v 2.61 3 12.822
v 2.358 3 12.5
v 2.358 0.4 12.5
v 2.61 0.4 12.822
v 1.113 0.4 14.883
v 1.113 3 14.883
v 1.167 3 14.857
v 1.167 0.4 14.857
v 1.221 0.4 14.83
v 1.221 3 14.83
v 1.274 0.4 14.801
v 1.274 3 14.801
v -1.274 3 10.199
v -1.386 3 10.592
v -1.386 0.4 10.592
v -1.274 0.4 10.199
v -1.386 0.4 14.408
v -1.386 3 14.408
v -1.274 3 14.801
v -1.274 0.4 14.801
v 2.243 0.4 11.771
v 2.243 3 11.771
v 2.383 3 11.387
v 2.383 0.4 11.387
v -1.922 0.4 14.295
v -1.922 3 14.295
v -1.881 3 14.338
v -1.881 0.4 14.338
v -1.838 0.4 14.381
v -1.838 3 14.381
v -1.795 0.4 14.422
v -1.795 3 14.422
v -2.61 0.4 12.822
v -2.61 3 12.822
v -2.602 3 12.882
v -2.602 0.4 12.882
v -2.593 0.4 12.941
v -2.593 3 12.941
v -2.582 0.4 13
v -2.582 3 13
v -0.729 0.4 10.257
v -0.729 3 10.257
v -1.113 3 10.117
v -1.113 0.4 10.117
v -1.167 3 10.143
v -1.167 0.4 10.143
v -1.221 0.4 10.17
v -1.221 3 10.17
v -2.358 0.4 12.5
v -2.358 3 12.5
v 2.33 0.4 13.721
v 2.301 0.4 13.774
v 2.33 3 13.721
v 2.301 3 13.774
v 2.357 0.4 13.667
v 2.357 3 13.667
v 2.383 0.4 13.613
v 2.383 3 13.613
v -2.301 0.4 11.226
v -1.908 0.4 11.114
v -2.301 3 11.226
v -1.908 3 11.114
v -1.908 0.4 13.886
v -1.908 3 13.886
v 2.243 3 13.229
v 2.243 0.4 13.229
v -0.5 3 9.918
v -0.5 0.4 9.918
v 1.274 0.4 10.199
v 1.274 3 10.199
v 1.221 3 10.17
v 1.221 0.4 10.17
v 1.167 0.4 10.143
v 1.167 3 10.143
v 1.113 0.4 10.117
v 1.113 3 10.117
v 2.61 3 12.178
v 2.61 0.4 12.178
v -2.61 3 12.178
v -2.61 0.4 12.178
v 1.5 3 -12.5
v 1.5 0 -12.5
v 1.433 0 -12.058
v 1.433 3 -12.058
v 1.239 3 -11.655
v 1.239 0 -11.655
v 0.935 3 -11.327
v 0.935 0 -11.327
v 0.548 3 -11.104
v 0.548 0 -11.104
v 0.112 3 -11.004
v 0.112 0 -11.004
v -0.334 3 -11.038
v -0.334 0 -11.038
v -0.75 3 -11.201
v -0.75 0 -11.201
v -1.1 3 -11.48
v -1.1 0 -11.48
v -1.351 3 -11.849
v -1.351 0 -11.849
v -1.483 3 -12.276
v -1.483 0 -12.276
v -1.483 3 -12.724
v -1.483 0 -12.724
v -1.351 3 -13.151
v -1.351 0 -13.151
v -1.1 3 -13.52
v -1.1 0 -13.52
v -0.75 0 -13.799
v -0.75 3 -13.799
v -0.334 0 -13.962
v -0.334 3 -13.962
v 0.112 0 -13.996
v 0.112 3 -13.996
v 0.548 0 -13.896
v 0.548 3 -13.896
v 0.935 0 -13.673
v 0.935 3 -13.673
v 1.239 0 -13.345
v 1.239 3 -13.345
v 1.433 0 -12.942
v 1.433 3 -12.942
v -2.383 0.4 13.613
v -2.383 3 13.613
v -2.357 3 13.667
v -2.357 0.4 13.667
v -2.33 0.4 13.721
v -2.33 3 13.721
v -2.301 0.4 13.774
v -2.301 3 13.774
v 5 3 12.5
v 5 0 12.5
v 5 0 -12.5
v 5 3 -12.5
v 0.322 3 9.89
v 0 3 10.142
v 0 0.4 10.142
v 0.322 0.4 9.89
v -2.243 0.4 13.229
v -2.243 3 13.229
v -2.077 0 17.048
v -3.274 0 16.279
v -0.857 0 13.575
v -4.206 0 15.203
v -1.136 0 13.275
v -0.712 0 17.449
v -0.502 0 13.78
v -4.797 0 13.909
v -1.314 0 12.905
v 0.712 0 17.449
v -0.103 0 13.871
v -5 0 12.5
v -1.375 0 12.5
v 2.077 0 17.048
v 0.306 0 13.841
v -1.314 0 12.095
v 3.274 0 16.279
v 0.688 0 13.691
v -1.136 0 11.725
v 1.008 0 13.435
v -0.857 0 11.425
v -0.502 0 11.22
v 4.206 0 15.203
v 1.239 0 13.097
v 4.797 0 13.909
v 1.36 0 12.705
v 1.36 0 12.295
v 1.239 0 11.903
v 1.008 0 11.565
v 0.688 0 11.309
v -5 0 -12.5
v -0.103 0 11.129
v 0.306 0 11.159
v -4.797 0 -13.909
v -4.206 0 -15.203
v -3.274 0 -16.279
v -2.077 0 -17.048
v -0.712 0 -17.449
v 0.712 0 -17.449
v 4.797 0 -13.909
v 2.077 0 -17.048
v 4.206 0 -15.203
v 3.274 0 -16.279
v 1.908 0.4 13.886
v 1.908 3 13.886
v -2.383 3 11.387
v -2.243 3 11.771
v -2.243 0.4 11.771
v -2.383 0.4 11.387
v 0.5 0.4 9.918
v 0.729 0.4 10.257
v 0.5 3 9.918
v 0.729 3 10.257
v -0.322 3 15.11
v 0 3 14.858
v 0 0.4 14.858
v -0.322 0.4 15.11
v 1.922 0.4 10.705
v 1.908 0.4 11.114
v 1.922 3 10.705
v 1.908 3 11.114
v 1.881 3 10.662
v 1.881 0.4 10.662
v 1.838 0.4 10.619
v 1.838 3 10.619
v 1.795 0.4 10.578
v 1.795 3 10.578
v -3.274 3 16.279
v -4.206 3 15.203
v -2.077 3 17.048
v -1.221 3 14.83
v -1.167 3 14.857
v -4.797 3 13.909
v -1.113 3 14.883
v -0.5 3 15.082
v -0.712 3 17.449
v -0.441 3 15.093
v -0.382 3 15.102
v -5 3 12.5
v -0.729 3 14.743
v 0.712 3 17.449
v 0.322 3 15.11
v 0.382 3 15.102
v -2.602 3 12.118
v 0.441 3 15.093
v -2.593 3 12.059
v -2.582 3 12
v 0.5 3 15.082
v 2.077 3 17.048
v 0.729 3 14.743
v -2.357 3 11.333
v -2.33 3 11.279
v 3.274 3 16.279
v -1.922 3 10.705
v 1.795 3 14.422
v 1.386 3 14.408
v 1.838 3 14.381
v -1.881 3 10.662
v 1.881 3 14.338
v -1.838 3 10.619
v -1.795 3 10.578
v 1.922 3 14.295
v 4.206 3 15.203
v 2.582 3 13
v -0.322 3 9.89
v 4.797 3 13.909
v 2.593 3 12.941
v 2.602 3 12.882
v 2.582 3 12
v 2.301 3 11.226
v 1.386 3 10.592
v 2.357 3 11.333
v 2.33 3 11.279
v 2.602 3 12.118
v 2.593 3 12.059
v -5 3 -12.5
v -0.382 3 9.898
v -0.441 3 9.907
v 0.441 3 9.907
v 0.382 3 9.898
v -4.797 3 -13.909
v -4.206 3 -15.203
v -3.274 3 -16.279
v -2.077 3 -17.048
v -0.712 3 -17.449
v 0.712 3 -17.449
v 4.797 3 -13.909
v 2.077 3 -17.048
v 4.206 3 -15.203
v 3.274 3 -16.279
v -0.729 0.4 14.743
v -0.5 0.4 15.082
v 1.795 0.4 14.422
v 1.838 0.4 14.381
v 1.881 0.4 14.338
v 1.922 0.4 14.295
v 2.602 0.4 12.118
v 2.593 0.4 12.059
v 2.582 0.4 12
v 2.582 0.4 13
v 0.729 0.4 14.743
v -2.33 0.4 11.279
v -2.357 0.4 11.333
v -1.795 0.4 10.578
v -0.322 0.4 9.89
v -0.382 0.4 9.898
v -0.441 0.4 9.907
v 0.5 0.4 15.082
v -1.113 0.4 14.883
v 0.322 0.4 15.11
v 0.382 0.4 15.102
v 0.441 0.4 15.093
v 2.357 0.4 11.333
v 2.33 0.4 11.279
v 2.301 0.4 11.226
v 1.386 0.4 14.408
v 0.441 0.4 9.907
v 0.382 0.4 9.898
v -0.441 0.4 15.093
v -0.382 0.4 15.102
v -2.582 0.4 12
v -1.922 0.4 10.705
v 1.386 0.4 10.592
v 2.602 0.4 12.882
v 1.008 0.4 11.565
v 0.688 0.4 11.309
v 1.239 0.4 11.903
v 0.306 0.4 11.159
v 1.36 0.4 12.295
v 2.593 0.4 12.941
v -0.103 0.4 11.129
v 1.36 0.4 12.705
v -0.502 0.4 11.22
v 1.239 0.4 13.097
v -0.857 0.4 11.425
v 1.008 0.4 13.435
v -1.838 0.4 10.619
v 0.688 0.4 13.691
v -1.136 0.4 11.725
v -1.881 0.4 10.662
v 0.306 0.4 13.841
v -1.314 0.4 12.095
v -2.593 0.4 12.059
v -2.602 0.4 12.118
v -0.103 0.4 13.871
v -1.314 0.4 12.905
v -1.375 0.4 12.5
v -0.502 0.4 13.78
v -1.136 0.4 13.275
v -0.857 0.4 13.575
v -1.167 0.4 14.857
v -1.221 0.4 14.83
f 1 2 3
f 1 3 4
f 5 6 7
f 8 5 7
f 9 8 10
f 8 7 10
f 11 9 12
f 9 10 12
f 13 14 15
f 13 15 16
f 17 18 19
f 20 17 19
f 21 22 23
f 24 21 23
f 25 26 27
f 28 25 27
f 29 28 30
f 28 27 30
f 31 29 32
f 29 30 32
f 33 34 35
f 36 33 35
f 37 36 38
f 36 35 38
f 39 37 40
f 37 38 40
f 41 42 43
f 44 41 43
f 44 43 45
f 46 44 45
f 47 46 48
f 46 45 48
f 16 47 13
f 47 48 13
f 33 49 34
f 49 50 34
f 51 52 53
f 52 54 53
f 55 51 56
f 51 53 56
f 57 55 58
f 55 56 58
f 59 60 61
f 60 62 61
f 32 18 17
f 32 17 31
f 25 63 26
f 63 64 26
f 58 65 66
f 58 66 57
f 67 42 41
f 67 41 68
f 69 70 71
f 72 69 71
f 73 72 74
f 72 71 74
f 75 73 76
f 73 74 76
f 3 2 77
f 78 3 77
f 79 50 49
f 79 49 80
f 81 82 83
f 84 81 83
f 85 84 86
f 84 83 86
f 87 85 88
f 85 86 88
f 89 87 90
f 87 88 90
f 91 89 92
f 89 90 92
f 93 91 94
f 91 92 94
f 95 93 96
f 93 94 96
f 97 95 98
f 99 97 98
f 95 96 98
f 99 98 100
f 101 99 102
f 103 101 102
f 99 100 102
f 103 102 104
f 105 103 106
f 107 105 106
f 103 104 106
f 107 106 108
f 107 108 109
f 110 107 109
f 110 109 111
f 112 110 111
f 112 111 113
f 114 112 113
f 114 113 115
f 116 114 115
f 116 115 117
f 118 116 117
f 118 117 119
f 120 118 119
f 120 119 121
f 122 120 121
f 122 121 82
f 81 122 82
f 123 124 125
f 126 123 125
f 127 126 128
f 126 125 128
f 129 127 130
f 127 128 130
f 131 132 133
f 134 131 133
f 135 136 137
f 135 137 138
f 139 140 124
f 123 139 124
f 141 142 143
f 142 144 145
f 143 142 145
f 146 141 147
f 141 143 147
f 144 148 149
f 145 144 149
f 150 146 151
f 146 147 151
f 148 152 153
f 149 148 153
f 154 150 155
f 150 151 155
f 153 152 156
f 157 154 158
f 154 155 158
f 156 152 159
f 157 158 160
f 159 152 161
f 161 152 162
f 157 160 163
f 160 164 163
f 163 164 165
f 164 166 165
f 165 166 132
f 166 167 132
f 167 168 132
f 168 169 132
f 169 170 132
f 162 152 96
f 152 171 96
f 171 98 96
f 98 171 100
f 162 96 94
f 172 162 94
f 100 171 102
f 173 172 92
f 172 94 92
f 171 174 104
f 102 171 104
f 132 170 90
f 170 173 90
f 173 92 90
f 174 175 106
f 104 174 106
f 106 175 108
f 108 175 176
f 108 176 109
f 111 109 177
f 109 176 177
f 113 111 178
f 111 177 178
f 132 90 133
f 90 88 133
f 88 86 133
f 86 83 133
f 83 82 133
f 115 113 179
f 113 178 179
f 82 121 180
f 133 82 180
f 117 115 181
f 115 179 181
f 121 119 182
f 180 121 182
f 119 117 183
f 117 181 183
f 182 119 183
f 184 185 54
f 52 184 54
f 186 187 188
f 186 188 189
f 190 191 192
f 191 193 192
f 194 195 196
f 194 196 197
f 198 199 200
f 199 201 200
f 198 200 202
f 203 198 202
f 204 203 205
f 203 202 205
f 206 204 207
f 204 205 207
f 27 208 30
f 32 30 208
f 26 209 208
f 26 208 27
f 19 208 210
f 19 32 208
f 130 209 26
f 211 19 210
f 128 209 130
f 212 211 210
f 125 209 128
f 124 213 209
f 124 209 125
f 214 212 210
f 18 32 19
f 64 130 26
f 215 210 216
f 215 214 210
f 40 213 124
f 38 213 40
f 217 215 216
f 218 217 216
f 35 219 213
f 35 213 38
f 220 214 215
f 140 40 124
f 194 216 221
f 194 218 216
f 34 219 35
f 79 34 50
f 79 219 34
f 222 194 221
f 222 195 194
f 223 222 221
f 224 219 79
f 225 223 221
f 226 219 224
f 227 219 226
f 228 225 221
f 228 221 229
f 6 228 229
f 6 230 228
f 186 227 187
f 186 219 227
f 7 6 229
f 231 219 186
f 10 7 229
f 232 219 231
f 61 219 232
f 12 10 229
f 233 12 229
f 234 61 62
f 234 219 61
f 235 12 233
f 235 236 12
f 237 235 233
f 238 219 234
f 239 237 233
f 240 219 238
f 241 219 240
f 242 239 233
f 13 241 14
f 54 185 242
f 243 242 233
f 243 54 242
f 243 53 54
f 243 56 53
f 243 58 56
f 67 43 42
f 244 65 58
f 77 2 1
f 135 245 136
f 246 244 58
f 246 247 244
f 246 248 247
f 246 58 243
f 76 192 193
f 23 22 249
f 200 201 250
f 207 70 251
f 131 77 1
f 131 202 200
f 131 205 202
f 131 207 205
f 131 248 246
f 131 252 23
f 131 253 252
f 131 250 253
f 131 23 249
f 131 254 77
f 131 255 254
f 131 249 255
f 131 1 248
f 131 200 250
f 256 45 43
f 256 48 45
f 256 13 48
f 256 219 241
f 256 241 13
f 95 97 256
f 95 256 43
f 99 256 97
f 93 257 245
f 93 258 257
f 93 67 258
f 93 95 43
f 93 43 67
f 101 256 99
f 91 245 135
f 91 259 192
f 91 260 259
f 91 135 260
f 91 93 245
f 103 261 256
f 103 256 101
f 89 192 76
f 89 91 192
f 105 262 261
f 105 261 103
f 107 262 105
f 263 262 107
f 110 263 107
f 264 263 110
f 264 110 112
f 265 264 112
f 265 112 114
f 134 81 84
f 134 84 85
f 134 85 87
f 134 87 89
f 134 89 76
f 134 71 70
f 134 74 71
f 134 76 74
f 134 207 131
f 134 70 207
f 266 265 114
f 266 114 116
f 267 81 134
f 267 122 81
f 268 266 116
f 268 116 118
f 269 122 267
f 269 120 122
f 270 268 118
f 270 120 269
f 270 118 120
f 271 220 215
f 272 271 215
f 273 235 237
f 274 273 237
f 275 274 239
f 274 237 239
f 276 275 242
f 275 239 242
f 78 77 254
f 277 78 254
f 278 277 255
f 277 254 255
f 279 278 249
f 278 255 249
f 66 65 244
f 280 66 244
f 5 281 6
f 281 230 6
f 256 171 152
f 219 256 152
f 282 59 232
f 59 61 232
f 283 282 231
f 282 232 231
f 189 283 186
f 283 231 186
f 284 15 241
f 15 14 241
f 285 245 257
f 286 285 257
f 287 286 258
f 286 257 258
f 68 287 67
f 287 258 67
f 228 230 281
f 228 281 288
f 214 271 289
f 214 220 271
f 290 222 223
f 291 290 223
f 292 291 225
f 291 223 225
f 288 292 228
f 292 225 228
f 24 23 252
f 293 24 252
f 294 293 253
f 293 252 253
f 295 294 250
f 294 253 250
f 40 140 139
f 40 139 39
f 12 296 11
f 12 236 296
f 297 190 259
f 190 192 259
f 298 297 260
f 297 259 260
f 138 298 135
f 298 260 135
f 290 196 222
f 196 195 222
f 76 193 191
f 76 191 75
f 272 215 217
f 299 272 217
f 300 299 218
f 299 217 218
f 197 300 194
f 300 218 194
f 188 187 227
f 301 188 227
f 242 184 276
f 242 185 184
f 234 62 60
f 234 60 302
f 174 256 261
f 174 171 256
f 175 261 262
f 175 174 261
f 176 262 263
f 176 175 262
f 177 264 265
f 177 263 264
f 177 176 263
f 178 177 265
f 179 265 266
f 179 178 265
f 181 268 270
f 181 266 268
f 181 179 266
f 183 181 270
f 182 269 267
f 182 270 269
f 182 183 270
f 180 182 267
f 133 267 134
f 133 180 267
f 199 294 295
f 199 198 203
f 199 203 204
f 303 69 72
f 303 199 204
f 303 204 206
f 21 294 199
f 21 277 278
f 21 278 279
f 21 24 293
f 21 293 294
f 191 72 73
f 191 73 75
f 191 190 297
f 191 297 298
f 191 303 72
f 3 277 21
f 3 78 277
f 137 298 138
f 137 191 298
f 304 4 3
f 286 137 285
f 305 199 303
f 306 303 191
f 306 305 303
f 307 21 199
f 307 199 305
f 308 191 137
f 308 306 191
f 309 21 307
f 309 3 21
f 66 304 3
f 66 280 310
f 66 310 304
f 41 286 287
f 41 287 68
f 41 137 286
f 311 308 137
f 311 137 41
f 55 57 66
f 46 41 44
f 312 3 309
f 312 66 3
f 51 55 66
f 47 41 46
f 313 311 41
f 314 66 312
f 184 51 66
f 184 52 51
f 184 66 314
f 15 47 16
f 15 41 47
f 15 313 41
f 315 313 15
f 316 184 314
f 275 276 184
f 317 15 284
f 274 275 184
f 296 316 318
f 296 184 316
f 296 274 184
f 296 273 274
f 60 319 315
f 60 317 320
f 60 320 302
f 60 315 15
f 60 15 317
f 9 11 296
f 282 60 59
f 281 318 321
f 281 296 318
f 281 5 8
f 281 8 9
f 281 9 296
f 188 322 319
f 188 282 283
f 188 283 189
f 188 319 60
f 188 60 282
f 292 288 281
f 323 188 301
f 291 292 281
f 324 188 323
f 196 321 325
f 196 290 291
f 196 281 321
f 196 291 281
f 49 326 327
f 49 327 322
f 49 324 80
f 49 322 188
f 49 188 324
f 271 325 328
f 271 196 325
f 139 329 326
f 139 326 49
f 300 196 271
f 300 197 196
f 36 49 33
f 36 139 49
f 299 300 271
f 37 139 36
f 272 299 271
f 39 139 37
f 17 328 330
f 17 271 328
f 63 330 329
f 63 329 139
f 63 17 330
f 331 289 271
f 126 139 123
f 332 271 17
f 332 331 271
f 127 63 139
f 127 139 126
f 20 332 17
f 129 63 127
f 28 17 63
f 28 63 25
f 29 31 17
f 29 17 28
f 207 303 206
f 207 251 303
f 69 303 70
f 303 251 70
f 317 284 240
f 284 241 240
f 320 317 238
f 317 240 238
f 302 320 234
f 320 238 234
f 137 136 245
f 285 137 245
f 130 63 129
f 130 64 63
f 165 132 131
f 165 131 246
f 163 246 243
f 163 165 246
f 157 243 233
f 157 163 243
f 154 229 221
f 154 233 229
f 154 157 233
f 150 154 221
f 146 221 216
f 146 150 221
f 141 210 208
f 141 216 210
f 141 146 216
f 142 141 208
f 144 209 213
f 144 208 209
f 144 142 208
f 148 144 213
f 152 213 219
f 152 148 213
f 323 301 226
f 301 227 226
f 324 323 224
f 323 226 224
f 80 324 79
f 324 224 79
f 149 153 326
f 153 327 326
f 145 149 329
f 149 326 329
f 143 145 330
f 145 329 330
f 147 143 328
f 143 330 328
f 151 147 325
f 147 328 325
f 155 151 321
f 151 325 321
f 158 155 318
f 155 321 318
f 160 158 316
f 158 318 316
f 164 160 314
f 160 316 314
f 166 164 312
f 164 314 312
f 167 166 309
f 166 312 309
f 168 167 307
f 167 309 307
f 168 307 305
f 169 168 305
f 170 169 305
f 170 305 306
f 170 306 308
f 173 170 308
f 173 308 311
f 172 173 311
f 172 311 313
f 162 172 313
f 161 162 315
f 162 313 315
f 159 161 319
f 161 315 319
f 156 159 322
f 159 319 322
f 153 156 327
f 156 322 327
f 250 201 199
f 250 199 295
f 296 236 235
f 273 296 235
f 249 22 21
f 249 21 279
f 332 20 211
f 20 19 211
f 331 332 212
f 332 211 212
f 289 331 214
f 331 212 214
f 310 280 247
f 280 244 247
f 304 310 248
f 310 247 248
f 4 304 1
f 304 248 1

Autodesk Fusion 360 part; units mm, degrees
sketch "Sketch1" plane through (0, 0, 0) normal (0, 1, 0) x (1, 0, 0)
  line L0 (5, 12.5) -> (-5, 12.5)
  line L1 (-5, 12.5) -> (-5, -12.5)
  line L2 (-5, -12.5) -> (5, -12.5)
  line L3 (5, -12.5) -> (5, 12.5)
  line L4 (5, 12.5) -> (-5, -12.5) construction
  line L5 (-5, 12.5) -> (5, -12.5) construction
  arc A0 (5, 12.5) -> (-5, 12.5) centre (0, 12.5) ccw
  line L6 (-5, 0) -> (5, 0) construction
  circle A1 centre (0, 12.5) radius 1.5
  arc A2 (-5, -12.5) -> (5, -12.5) centre (0, -12.5) ccw
  circle A3 centre (0, -12.5) radius 1.5
  dimension "d1" = 10
  dimension "d2" = 25
  dimension "d3" = 3
extrude "Extrude1" add sketch "Sketch1" along normal blind 3 contours L0 L1 L2 L3 A1 A3 | L0 A0 A1 | L2 A2 A3 | L2 A3 | L2 A3
sketch "Boceto2" plane through (0, 3, 0) normal (0, 1, 0) x (-1, 0, 0)
  circle A0 centre (0, -12.5) radius 1.5
  arc A1 (5, 12.5) -> (-5, 12.5) centre (0, 12.5) ccw
  line L0 (-5, 12.5) -> (-5, -12.5)
  arc A2 (-5, -12.5) -> (5, -12.5) centre (0, -12.5) ccw
  line L1 (5, -12.5) -> (5, 12.5)
  circle A3 centre (0, 12.5) radius 2.63
  line L2 (0, 9.87) -> (0, 15.13) construction
  line L3 (0, 10.1418) -> (0.322, 9.8898)
  line L4 (0, 10.1418) -> (-0.322, 9.8898)
  line L5 (0.7287, 10.2572) -> (1.1128, 10.117)
  line L6 (0.7287, 10.2572) -> (0.5004, 9.918)
  line L7 (1.3861, 10.5922) -> (1.7947, 10.5776)
  line L8 (1.3861, 10.5922) -> (1.2737, 10.199)
  line L9 (1.9078, 11.1139) -> (2.301, 11.2263)
  line L10 (1.9078, 11.1139) -> (1.9224, 10.7053)
  line L11 (2.2428, 11.7713) -> (2.582, 11.9996)
  line L12 (2.2428, 11.7713) -> (2.383, 11.3872)
  line L13 (2.3582, 12.5) -> (2.6102, 12.822)
  line L14 (2.3582, 12.5) -> (2.6102, 12.178)
  line L15 (2.2428, 13.2287) -> (2.383, 13.6128)
  line L16 (2.2428, 13.2287) -> (2.582, 13.0004)
  line L17 (1.9078, 13.8861) -> (1.9224, 14.2947)
  line L18 (1.9078, 13.8861) -> (2.301, 13.7737)
  line L19 (1.3861, 14.4078) -> (1.2737, 14.801)
  line L20 (1.3861, 14.4078) -> (1.7947, 14.4224)
  line L21 (0.7287, 14.7428) -> (0.5004, 15.082)
  line L22 (0.7287, 14.7428) -> (1.1128, 14.883)
  line L23 (0, 14.8582) -> (-0.322, 15.1102)
  line L24 (0, 14.8582) -> (0.322, 15.1102)
  line L25 (-0.7287, 14.7428) -> (-1.1128, 14.883)
  line L26 (-0.7287, 14.7428) -> (-0.5004, 15.082)
  line L27 (-1.3861, 14.4078) -> (-1.7947, 14.4224)
  line L28 (-1.3861, 14.4078) -> (-1.2737, 14.801)
  line L29 (-1.9078, 13.8861) -> (-2.301, 13.7737)
  line L30 (-1.9078, 13.8861) -> (-1.9224, 14.2947)
  line L31 (-2.2428, 13.2287) -> (-2.582, 13.0004)
  line L32 (-2.2428, 13.2287) -> (-2.383, 13.6128)
  line L33 (-2.3582, 12.5) -> (-2.6102, 12.178)
  line L34 (-2.3582, 12.5) -> (-2.6102, 12.822)
  line L35 (-2.2428, 11.7713) -> (-2.383, 11.3872)
  line L36 (-2.2428, 11.7713) -> (-2.582, 11.9996)
  line L37 (-1.9078, 11.1139) -> (-1.9224, 10.7053)
  line L38 (-1.9078, 11.1139) -> (-2.301, 11.2263)
  line L39 (-1.3861, 10.5922) -> (-1.2737, 10.199)
  line L40 (-1.3861, 10.5922) -> (-1.7947, 10.5776)
  line L41 (-0.7287, 10.2572) -> (-0.5004, 9.918)
  line L42 (-0.7287, 10.2572) -> (-1.1128, 10.117)
  dimension "d6" = 5.26
  dimension "d7" = 0.252
  dimension "d8" = 0.322
  dimension "d10" = 360
extrude "Extruir2" cut sketch "Boceto2" against normal blind 2.6 contours A3 L3 L4 L5 L6 L7 L8 L9 L10 L11 L12 L13 L14 L15 L16 L17 L18 L19 L20 L21 L22 L23 L24 L25 L26 L27 L28 L29 L30 L31 L32 L33 L34 L35 L36 L37 L38 L39 L40 L41 L42
sketch "Boceto3" plane through (0, 0.4, 0) normal (0, 1, 0) x (-1, 0, 0)
  arc A0 (-0.5004, 9.918) -> (-0.322, 9.8898) centre (0, 12.5) ccw
  line L0 (-0.322, 9.8898) -> (0, 10.1418)
  line L1 (0, 10.1418) -> (0.322, 9.8898)
  arc A1 (0.322, 9.8898) -> (0.5004, 9.918) centre (0, 12.5) ccw
  line L2 (0.5004, 9.918) -> (0.7287, 10.2572)
  line L3 (0.7287, 10.2572) -> (1.1128, 10.117)
  arc A2 (1.1128, 10.117) -> (1.2737, 10.199) centre (0, 12.5) ccw
  line L4 (1.2737, 10.199) -> (1.3861, 10.5922)
  line L5 (1.3861, 10.5922) -> (1.7947, 10.5776)
  arc A3 (1.7947, 10.5776) -> (1.9224, 10.7053) centre (0, 12.5) ccw
  line L6 (1.9224, 10.7053) -> (1.9078, 11.1139)
  line L7 (1.9078, 11.1139) -> (2.301, 11.2263)
  arc A4 (2.301, 11.2263) -> (2.383, 11.3872) centre (0, 12.5) ccw
  line L8 (2.383, 11.3872) -> (2.2428, 11.7713)
  line L9 (2.2428, 11.7713) -> (2.582, 11.9996)
  arc A5 (2.582, 11.9996) -> (2.6102, 12.178) centre (0, 12.5) ccw
  line L10 (2.6102, 12.178) -> (2.3582, 12.5)
  line L11 (2.3582, 12.5) -> (2.6102, 12.822)
  arc A6 (2.6102, 12.822) -> (2.582, 13.0004) centre (0, 12.5) ccw
  line L12 (2.582, 13.0004) -> (2.2428, 13.2287)
  line L13 (2.2428, 13.2287) -> (2.383, 13.6128)
  arc A7 (2.383, 13.6128) -> (2.301, 13.7737) centre (0, 12.5) ccw
  line L14 (2.301, 13.7737) -> (1.9078, 13.8861)
  line L15 (1.9078, 13.8861) -> (1.9224, 14.2947)
  arc A8 (1.9224, 14.2947) -> (1.7947, 14.4224) centre (0, 12.5) ccw
  line L16 (1.7947, 14.4224) -> (1.3861, 14.4078)
  line L17 (1.3861, 14.4078) -> (1.2737, 14.801)
  arc A9 (1.2737, 14.801) -> (1.1128, 14.883) centre (0, 12.5) ccw
  line L18 (1.1128, 14.883) -> (0.7287, 14.7428)
  line L19 (0.7287, 14.7428) -> (0.5004, 15.082)
  arc A10 (0.5004, 15.082) -> (0.322, 15.1102) centre (0, 12.5) ccw
  line L20 (0.322, 15.1102) -> (0, 14.8582)
  line L21 (0, 14.8582) -> (-0.322, 15.1102)
  arc A11 (-0.322, 15.1102) -> (-0.5004, 15.082) centre (0, 12.5) ccw
  line L22 (-0.5004, 15.082) -> (-0.7287, 14.7428)
  line L23 (-0.7287, 14.7428) -> (-1.1128, 14.883)
  arc A12 (-1.1128, 14.883) -> (-1.2737, 14.801) centre (0, 12.5) ccw
  line L24 (-1.2737, 14.801) -> (-1.3861, 14.4078)
  line L25 (-1.3861, 14.4078) -> (-1.7947, 14.4224)
  arc A13 (-1.7947, 14.4224) -> (-1.9224, 14.2947) centre (0, 12.5) ccw
  line L26 (-1.9224, 14.2947) -> (-1.9078, 13.8861)
  line L27 (-1.9078, 13.8861) -> (-2.301, 13.7737)
  arc A14 (-2.301, 13.7737) -> (-2.383, 13.6128) centre (0, 12.5) ccw
  line L28 (-2.383, 13.6128) -> (-2.2428, 13.2287)
  line L29 (-2.2428, 13.2287) -> (-2.582, 13.0004)
  arc A15 (-2.582, 13.0004) -> (-2.6102, 12.822) centre (0, 12.5) ccw
  line L30 (-2.6102, 12.822) -> (-2.3582, 12.5)
  line L31 (-2.3582, 12.5) -> (-2.6102, 12.178)
  arc A16 (-2.6102, 12.178) -> (-2.582, 11.9996) centre (0, 12.5) ccw
  line L32 (-2.582, 11.9996) -> (-2.2428, 11.7713)
  line L33 (-2.2428, 11.7713) -> (-2.383, 11.3872)
  arc A17 (-2.383, 11.3872) -> (-2.301, 11.2263) centre (0, 12.5) ccw
  line L34 (-2.301, 11.2263) -> (-1.9078, 11.1139)
  line L35 (-1.9078, 11.1139) -> (-1.9224, 10.7053)
  arc A18 (-1.9224, 10.7053) -> (-1.7947, 10.5776) centre (0, 12.5) ccw
  line L36 (-1.7947, 10.5776) -> (-1.3861, 10.5922)
  line L37 (-1.3861, 10.5922) -> (-1.2737, 10.199)
  arc A19 (-1.2737, 10.199) -> (-1.1128, 10.117) centre (0, 12.5) ccw
  line L38 (-1.1128, 10.117) -> (-0.7287, 10.2572)
  line L39 (-0.7287, 10.2572) -> (-0.5004, 9.918)
  circle A20 centre (0, 12.5) radius 1.375
  dimension "d13" = 2.75
extrude "Extruir3" cut sketch "Boceto3" against normal blind 0.5 contours A20
